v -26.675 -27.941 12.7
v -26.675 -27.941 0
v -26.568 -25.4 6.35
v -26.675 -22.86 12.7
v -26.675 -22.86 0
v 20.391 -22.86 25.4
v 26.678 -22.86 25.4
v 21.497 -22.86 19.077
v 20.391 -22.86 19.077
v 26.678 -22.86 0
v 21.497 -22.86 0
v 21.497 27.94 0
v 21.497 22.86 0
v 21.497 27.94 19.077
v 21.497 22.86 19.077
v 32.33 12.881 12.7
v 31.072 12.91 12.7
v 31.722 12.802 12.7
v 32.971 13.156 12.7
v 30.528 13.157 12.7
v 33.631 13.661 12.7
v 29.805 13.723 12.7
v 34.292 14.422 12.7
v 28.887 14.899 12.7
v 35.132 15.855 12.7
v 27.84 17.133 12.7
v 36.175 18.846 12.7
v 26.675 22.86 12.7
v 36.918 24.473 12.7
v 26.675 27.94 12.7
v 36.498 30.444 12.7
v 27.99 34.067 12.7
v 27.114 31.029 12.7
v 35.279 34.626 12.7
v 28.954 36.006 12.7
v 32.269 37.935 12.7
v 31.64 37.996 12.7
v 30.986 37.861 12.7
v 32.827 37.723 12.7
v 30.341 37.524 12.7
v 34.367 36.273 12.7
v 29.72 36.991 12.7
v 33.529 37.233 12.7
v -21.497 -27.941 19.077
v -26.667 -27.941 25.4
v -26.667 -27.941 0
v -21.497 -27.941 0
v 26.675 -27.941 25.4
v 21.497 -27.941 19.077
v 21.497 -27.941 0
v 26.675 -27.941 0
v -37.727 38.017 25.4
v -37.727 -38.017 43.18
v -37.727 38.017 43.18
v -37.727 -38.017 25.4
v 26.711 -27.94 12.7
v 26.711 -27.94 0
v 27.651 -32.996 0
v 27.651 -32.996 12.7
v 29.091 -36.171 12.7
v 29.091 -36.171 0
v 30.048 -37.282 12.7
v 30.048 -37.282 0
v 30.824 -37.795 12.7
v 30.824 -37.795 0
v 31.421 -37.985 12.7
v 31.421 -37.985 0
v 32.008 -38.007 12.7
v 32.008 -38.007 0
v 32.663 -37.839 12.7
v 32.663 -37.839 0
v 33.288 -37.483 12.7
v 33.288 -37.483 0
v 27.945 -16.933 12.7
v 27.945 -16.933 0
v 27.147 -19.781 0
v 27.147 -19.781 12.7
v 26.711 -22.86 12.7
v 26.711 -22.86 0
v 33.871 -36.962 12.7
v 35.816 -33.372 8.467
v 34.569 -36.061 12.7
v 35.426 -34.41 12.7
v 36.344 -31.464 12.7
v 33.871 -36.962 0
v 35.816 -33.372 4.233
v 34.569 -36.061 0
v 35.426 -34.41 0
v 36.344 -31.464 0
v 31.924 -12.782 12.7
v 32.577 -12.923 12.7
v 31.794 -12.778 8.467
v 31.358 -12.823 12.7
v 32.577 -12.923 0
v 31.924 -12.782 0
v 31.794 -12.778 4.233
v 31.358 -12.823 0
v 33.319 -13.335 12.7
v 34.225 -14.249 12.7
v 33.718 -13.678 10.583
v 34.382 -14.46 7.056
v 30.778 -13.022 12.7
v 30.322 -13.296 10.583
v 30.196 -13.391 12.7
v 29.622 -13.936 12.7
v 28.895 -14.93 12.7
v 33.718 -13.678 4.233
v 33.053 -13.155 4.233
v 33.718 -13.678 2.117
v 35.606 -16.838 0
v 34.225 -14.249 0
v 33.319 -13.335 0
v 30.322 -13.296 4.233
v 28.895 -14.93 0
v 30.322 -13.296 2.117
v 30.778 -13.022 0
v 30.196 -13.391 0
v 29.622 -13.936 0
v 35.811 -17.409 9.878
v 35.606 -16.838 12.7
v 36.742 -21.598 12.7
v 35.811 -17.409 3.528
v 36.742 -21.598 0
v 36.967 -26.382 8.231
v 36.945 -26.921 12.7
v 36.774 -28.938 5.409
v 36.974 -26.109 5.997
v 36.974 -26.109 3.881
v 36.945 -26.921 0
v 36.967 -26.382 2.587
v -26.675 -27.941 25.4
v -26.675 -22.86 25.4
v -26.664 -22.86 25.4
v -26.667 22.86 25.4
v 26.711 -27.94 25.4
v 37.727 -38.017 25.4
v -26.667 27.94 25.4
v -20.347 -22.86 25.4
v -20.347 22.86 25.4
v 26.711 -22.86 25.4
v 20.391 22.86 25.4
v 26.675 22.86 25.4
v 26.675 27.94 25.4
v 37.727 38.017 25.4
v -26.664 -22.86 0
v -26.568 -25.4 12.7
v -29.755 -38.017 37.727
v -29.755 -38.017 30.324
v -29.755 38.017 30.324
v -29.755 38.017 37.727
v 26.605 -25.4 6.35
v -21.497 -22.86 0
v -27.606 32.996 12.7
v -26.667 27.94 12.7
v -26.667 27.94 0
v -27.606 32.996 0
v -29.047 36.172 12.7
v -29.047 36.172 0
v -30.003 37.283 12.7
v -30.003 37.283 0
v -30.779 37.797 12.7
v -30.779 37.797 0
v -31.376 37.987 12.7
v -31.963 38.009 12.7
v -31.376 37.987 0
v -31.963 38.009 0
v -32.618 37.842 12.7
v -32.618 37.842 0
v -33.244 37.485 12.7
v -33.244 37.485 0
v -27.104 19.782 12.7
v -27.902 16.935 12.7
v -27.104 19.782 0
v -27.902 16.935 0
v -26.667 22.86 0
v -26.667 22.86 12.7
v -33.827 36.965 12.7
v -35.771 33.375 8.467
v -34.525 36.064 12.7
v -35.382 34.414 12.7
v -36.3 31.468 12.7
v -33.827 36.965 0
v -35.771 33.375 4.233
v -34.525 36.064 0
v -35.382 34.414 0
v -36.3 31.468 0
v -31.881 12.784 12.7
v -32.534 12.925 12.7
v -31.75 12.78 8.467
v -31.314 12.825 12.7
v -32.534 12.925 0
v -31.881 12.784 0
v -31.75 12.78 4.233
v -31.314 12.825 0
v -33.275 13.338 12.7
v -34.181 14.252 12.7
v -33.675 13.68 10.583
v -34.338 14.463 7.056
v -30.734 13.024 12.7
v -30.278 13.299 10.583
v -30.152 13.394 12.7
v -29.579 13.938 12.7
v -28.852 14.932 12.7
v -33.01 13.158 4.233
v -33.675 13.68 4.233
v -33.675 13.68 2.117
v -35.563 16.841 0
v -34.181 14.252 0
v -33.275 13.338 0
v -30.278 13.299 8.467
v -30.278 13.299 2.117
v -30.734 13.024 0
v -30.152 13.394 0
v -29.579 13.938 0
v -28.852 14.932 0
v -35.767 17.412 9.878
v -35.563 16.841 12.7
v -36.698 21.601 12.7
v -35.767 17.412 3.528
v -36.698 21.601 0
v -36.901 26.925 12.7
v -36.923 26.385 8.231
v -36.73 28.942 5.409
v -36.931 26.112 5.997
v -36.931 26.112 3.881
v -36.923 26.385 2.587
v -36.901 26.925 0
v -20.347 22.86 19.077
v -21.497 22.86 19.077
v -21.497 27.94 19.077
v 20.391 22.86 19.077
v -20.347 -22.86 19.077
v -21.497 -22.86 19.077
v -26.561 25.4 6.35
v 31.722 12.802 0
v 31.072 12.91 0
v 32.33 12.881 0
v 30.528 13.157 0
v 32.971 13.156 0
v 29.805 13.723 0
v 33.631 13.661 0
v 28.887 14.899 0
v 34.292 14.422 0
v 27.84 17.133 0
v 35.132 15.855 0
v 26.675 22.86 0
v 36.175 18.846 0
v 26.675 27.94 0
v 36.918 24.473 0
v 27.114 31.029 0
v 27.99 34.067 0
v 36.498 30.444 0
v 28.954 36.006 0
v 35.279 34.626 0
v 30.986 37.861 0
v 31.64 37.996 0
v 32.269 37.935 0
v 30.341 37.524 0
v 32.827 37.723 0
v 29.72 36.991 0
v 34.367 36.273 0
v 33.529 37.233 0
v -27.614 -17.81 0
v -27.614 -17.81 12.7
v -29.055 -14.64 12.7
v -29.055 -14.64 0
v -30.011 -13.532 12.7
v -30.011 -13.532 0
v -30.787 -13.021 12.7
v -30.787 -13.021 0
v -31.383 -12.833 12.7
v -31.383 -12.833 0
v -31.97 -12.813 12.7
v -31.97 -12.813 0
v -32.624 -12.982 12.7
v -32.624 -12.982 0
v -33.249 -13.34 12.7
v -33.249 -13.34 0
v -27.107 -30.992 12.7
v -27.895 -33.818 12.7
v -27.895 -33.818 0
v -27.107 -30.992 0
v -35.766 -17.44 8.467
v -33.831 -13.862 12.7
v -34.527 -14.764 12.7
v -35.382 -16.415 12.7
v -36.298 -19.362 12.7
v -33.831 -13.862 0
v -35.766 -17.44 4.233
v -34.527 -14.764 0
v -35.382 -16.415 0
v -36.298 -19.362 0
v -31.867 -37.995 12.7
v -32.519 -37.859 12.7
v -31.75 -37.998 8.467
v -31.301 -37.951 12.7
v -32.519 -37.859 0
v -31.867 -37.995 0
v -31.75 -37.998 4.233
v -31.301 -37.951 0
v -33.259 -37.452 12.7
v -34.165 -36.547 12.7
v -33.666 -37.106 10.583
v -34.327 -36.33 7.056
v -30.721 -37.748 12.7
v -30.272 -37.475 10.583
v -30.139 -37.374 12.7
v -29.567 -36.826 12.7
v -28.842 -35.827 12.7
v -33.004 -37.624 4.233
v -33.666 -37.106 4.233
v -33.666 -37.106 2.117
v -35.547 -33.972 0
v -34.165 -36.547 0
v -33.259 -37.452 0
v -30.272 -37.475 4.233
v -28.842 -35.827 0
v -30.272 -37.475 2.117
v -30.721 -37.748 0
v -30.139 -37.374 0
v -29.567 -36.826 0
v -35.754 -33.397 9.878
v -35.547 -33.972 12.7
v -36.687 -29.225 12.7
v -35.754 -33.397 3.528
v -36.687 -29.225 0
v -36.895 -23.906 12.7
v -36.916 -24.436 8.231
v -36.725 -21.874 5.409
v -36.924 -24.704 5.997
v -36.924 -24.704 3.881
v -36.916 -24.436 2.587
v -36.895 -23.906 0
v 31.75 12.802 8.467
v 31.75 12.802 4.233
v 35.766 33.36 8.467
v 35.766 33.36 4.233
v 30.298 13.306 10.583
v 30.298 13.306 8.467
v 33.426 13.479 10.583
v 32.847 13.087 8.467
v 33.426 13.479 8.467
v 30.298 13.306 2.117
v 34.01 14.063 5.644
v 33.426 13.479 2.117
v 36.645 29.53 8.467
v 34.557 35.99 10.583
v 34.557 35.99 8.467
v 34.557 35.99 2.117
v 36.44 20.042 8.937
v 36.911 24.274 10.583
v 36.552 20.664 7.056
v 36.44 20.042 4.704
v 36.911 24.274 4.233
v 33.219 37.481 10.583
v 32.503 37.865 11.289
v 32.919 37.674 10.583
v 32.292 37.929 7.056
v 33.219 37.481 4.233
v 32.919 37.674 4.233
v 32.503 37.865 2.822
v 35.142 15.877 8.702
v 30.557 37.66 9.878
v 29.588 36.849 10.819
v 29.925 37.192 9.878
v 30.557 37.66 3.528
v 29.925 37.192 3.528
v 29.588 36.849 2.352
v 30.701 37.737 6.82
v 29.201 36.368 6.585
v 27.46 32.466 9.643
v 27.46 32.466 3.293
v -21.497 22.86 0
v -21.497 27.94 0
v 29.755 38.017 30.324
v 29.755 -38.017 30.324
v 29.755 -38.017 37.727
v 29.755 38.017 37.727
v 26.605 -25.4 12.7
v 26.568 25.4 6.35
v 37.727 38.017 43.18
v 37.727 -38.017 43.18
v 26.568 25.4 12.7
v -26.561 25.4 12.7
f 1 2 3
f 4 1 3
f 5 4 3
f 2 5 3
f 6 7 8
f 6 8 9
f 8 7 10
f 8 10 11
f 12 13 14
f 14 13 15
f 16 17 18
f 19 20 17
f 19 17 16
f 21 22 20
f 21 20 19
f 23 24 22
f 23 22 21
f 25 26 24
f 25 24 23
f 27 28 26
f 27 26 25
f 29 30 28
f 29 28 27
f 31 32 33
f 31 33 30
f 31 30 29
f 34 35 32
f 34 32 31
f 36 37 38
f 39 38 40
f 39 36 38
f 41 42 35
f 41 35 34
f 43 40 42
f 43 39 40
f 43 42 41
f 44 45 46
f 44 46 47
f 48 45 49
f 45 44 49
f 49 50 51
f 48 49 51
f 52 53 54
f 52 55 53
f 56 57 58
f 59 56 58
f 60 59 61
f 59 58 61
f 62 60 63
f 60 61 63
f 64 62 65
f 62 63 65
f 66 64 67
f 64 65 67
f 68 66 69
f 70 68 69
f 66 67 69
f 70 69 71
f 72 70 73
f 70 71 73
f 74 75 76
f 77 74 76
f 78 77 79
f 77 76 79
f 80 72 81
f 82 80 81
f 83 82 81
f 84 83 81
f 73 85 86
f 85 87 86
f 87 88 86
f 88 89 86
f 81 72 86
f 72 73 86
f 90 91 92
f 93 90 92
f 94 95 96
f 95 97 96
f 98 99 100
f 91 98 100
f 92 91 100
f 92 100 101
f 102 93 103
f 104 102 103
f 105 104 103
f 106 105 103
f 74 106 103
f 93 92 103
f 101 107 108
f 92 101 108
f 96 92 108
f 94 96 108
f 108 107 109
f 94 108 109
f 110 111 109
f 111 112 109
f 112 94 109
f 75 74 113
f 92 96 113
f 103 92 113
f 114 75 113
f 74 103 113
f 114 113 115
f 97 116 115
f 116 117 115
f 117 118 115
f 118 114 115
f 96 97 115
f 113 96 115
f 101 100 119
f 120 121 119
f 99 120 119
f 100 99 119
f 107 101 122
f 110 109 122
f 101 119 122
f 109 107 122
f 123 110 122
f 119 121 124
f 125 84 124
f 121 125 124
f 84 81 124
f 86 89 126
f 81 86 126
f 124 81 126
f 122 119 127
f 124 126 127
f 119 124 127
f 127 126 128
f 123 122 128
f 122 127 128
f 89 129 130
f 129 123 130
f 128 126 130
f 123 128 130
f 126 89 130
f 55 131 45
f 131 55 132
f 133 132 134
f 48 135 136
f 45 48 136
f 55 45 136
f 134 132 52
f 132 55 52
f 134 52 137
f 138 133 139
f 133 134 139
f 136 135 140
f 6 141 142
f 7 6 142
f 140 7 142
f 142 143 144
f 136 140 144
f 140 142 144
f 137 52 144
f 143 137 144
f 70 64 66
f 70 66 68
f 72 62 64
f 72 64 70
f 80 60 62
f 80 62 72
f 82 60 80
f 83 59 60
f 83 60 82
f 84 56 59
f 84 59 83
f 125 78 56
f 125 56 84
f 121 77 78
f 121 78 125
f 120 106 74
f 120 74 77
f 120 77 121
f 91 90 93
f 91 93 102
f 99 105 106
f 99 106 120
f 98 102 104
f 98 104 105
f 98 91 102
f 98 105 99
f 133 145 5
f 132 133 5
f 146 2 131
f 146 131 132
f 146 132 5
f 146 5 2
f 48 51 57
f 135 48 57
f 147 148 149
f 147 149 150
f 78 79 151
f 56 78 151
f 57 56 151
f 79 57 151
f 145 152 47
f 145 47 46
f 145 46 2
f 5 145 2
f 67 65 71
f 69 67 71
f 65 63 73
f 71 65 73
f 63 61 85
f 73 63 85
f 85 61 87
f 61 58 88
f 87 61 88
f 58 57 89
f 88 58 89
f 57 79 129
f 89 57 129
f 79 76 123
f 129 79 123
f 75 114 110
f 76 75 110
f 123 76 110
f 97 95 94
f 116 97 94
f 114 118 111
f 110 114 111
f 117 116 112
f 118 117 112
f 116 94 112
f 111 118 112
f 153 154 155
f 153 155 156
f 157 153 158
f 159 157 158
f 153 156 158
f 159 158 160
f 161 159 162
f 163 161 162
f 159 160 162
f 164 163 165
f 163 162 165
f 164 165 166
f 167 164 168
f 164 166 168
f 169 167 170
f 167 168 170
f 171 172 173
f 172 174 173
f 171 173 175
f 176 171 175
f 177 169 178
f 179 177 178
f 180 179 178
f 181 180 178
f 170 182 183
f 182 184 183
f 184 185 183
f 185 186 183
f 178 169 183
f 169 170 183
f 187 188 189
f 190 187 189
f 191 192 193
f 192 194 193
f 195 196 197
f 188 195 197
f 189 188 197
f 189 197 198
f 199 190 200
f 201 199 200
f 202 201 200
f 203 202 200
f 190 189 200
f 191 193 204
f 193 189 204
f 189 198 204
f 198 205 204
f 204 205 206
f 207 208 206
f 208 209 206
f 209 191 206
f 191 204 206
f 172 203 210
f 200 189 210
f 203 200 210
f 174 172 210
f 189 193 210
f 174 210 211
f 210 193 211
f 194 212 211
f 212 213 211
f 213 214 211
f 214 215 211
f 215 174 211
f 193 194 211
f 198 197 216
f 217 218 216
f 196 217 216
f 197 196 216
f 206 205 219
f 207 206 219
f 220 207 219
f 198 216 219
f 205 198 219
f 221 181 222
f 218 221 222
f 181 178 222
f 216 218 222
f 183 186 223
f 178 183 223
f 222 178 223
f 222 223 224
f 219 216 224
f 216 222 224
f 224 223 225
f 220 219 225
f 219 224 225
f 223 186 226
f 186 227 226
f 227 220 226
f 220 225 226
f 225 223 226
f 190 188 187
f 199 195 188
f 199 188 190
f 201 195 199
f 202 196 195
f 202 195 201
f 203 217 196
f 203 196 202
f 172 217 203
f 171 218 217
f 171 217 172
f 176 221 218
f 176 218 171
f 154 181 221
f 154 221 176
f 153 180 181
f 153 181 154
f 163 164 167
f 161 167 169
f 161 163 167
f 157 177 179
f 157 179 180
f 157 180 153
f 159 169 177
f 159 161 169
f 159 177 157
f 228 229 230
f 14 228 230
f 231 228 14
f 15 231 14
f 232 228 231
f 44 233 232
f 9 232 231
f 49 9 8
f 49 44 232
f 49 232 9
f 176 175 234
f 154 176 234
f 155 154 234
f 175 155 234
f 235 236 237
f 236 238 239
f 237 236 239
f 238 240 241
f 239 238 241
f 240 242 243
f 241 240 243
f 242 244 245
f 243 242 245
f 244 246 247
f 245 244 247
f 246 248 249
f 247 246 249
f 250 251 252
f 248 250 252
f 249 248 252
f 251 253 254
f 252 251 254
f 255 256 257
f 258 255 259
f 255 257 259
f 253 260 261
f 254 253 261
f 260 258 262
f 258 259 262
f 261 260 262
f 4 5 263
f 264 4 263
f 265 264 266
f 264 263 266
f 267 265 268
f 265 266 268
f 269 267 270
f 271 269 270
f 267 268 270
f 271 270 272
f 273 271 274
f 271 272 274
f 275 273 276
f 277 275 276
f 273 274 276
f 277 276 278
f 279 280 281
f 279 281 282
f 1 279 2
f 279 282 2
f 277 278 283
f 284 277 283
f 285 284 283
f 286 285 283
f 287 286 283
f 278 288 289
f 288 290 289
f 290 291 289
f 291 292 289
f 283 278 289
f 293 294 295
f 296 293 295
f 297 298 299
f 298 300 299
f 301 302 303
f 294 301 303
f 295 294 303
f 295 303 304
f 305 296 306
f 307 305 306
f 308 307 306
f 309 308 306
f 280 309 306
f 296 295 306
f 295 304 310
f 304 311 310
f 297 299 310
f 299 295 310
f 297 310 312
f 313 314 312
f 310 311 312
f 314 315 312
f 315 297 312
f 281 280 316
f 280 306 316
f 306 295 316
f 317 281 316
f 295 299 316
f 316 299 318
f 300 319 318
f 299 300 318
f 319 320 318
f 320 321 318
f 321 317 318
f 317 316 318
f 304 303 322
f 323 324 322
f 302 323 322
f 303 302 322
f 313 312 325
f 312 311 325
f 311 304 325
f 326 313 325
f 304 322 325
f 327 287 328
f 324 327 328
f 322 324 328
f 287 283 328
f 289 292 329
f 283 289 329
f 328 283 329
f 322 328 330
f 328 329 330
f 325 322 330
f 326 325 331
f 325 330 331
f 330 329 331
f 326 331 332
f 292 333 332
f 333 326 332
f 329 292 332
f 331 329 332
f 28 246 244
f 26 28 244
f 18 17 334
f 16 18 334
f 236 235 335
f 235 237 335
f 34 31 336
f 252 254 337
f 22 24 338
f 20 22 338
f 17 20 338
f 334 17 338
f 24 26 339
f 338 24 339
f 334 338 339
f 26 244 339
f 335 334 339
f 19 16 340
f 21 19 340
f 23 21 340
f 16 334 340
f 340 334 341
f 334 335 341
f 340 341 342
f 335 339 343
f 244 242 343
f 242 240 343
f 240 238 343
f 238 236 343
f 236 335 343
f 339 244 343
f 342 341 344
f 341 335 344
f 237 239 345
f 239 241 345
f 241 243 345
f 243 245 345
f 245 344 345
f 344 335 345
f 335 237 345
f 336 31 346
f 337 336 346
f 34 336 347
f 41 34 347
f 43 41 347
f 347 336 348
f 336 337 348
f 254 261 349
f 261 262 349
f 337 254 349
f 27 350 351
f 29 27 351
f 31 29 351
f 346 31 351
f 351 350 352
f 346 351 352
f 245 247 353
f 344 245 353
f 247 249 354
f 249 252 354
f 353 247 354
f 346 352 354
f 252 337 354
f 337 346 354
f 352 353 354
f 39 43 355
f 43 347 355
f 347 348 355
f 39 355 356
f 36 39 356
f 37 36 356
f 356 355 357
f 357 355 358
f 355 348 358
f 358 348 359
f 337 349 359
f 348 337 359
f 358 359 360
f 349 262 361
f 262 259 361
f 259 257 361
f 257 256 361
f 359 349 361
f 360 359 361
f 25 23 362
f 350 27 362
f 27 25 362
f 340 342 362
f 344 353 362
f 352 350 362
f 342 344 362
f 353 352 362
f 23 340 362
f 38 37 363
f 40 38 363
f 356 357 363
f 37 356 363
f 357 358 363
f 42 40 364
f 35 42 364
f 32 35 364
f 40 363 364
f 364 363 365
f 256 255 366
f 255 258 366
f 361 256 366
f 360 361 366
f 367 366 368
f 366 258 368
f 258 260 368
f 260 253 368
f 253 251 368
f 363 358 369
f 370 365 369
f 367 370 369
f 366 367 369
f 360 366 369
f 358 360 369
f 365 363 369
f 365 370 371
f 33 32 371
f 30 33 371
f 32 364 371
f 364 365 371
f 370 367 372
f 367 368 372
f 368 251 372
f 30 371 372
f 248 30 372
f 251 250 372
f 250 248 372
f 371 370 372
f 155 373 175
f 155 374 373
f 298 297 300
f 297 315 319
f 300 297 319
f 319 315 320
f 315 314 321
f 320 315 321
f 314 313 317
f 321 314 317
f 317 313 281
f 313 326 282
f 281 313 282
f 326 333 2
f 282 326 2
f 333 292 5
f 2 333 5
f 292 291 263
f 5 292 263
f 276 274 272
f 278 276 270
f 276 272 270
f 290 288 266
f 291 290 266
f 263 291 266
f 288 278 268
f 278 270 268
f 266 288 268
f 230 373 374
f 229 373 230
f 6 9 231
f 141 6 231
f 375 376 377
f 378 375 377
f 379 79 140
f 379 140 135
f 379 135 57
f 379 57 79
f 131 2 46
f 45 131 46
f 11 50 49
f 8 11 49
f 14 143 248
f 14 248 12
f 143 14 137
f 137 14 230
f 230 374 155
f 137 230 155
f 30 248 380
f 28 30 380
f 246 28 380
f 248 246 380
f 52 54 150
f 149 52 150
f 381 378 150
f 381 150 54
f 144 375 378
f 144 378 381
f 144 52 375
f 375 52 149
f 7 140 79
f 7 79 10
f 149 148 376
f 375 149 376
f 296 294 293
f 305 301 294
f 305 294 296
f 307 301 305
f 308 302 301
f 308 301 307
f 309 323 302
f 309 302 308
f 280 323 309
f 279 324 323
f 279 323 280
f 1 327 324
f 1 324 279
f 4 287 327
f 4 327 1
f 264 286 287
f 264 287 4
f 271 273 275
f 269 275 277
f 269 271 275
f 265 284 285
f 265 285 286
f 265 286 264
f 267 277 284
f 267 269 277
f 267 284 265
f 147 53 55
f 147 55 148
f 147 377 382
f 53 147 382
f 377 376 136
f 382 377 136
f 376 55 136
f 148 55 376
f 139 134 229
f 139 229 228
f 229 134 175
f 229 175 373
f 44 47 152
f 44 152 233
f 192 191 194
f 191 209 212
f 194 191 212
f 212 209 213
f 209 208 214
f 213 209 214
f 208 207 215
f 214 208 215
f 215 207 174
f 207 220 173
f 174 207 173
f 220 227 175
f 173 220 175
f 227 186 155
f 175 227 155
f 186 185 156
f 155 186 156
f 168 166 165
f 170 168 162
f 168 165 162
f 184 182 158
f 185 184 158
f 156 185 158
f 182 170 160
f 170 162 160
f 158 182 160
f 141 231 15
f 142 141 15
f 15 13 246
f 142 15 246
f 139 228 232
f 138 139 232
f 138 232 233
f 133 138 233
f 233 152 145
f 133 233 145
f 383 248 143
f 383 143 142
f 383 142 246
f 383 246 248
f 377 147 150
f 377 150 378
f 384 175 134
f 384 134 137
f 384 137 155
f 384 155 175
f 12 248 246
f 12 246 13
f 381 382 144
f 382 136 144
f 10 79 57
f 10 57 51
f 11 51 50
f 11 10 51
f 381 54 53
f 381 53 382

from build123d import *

# Parameters (mm, degrees)
F1_DEPTH  = 12.7
F2_DEPTH  = 25.4
F3_W      = 75.4542723298
F3_H      = 76.0345155845
F4_DEPTH  = 5.08
F5_W      = 75.4542723298
F5_H      = 76.0345155845
F5_W_2    = 62.7542723298
F5_H_2    = 63.3345155845
F6_DEPTH  = 12.7
F7_W      = 59.5092140138
F7_H      = 7.4030607939
F8_DEPTH  = 76.2
F9_W      = 42.9946966469
F9_H      = 19.0771184862
F10_DEPTH = 76.2


with BuildPart() as f1:
    # F0 (on Top) → F1 (new body)
    with BuildSketch(Plane.XY):
        with BuildLine():
            add(Edge.make_bspline(
                [(-26.6673212629, 27.94), (-28.8665013823, 53.9696522782), (-35.7714125826, 33.37500591), (-42.676323783, 12.7803595418), (-31.75, 12.7803595418)],
                knots=[1.7734542453, 1.7734542453, 1.7734542453, 4.0283197763, 4.0283197763, 6.2831853072, 6.2831853072, 6.2831853072], degree=2, weights=[1, 0.4289802376, 1, 0.4289802376, 1]))
            add(Edge.make_bspline(
                [(-31.75, 12.7803595418), (-27.5189248367, 12.7803595418), (-26.6673212629, 22.86)],
                knots=[0, 0, 0, 1.3681384083, 1.3681384083, 1.3681384083], degree=2, weights=[1, 0.775007601, 1]))
            add(Edge.make_bspline(
                [(-26.6673212629, 22.86), (-26.4527230254, 25.4), (-26.6673212629, 27.94)],
                knots=[1.3681384083, 1.3681384083, 1.3681384083, 1.7734542453, 1.7734542453, 1.7734542453], degree=2, weights=[1, 0.9795350697, 1]))
        make_face()
    extrude(amount=F1_DEPTH)


with BuildPart() as f1b:
    # F0 (on Top) → F1, piece 2 (new body)
    with BuildSketch(Plane.XY):
        with BuildLine():
            add(Edge.make_bspline(
                [(31.7938316671, -12.7779768759), (27.5620741915, -12.7779768759), (26.7109880314, -22.8595698679)],
                knots=[0, 0, 0, 1.36829636, 1.36829636, 1.36829636], degree=2, weights=[1, 0.7749576896, 1]))
            add(Edge.make_bspline(
                [(26.7109880314, -22.8595698679), (26.4965220883, -25.4000392711), (26.7113807542, -27.9403123866)],
                knots=[1.36829636, 1.36829636, 1.36829636, 1.7736722722, 1.7736722722, 1.7736722722], degree=2, weights=[1, 0.9795290235, 1]))
            add(Edge.make_bspline(
                [(26.7113807542, -27.9403123866), (28.9125846693, -53.9651371457), (35.8156016935, -33.3715570108), (42.7186187177, -12.7779768759), (31.7938316671, -12.7779768759)],
                knots=[1.7736722722, 1.7736722722, 1.7736722722, 4.0284287897, 4.0284287897, 6.2831853072, 6.2831853072, 6.2831853072], degree=2, weights=[1, 0.4290294736, 1, 0.4290294736, 1]))
        make_face()
    extrude(amount=F1_DEPTH)


with BuildPart() as f1c:
    # F0 (on Top) → F1, piece 3 (new body)
    with BuildSketch(Plane.XY):
        with BuildLine():
            add(Edge.make_bspline(
                [(31.75, 12.8016), (42.6585799166, 12.8016), (35.7663465411, 33.3598915369), (28.8741131655, 53.9181830739), (26.6748026985, 27.94)],
                knots=[0, 0, 0, 2.2546923099, 2.2546923099, 4.5093846197, 4.5093846197, 4.5093846197], degree=2, weights=[1, 0.4290584725, 1, 0.4290584725, 1]))
            add(Edge.make_bspline(
                [(26.6748026985, 27.94), (26.4597665441, 25.4), (26.6748026985, 22.86)],
                knots=[4.5093846197, 4.5093846197, 4.5093846197, 4.915393341, 4.915393341, 4.915393341], degree=2, weights=[1, 0.9794652813, 1]))
            add(Edge.make_bspline(
                [(26.6748026985, 22.86), (27.5263458699, 12.8016), (31.75, 12.8016)],
                knots=[4.915393341, 4.915393341, 4.915393341, 6.2831853072, 6.2831853072, 6.2831853072], degree=2, weights=[1, 0.7751170567, 1]))
        make_face()
    extrude(amount=F1_DEPTH)


with BuildPart() as f1d:
    # F0 (on Top) → F1, piece 4 (new body)
    with BuildSketch(Plane.XY):
        with BuildLine():
            add(Edge.make_bspline(
                [(-26.6748525876, -27.940589218), (-26.4597237971, -25.4001093108), (-26.6748348282, -22.8596205137)],
                knots=[1.3677442161, 1.3677442161, 1.3677442161, 1.7738314409, 1.7738314409, 1.7738314409], degree=2, weights=[1, 0.9794573669, 1]))
            add(Edge.make_bspline(
                [(-26.6748348282, -22.8596205137), (-28.8744302457, 3.1178827579), (-35.7663968812, -17.440258621), (-42.6583635168, -37.9984), (-31.75, -37.9984)],
                knots=[1.7738314409, 1.7738314409, 1.7738314409, 4.028508374, 4.028508374, 6.2831853072, 6.2831853072, 6.2831853072], degree=2, weights=[1, 0.4290654172, 1, 0.4290654172, 1]))
            add(Edge.make_bspline(
                [(-31.75, -37.9984), (-27.5265517738, -37.9984), (-26.6748525876, -27.940589218)],
                knots=[0, 0, 0, 1.3677442161, 1.3677442161, 1.3677442161], degree=2, weights=[1, 0.7751321412, 1]))
        make_face()
    extrude(amount=F1_DEPTH)


with BuildPart() as f2:
    # F0 (on Top) → F2 (new body)
    with BuildSketch(Plane.XY):
        with BuildLine():
            add(Edge.make_bspline(
                [(-26.6673212629, 22.86), (-26.4527230254, 25.4), (-26.6673212629, 27.94)],
                knots=[1.3681384083, 1.3681384083, 1.3681384083, 1.7734542453, 1.7734542453, 1.7734542453], degree=2, weights=[1, 0.9795350697, 1]))
            Line((-26.6673212629, 22.86), (-20.3471054377, 22.86))
            Line((-20.3471054377, 22.86), (-20.3471054377, -22.8596810407))
            Line((-20.3471054377, -22.8596810407), (-26.6641747104, -22.8596810407))
            Line((-26.6641747104, -22.8596810407), (-26.6748348282, -22.8596205137))
            add(Edge.make_bspline(
                [(-26.6748525876, -27.940589218), (-26.4597237971, -25.4001093108), (-26.6748348282, -22.8596205137)],
                knots=[1.3677442161, 1.3677442161, 1.3677442161, 1.7738314409, 1.7738314409, 1.7738314409], degree=2, weights=[1, 0.9794573669, 1]))
            Line((-26.6748525876, -27.940589218), (-26.6674692391, -27.9405932133))
            Line((-26.6674692391, -27.9405932133), (26.6746547223, -27.9405932133))
            Line((26.6746547223, -27.9405932133), (26.7113807542, -27.9403123866))
            add(Edge.make_bspline(
                [(26.7109880314, -22.8595698679), (26.4965220883, -25.4000392711), (26.7113807542, -27.9403123866)],
                knots=[1.36829636, 1.36829636, 1.36829636, 1.7736722722, 1.7736722722, 1.7736722722], degree=2, weights=[1, 0.9795290235, 1]))
            Line((26.7109880314, -22.8595698679), (26.677949251, -22.8596810407))
            Line((26.677949251, -22.8596810407), (20.3909371048, -22.8596810407))
            Line((20.3909371048, -22.8596810407), (20.3909371048, 22.86))
            Line((20.3909371048, 22.86), (26.6748026985, 22.86))
            add(Edge.make_bspline(
                [(26.6748026985, 27.94), (26.4597665441, 25.4), (26.6748026985, 22.86)],
                knots=[4.5093846197, 4.5093846197, 4.5093846197, 4.915393341, 4.915393341, 4.915393341], degree=2, weights=[1, 0.9794652813, 1]))
            Line((26.6748026985, 27.94), (-26.6673212629, 27.94))
        make_face()
    extrude(amount=F2_DEPTH)

    # F3 (on face) → F4 (join)
    with BuildSketch(Plane.XY.offset(25.4)):
        Rectangle(F3_W, F3_H)
    extrude(amount=F4_DEPTH)

    # F5 (on face) → F6 (join)
    with BuildSketch(Plane.XY.offset(30.48)):
        Rectangle(F5_W, F5_H)
        Rectangle(F5_W_2, F5_H_2, mode=Mode.SUBTRACT)
        Rectangle(F5_W_2, F5_H_2)
    extrude(amount=F6_DEPTH)

    # F7 (on face) → F8 (cut)
    with BuildSketch(Plane.XZ.offset(38.0172577923)):
        with Locations((0, 34.025605768)):
            Rectangle(F7_W, F7_H)
    extrude(amount=-F8_DEPTH, mode=Mode.SUBTRACT)

    # F9 (on face) → F10 (cut)
    with BuildSketch(Plane.XZ.offset(27.9405932133)):
        with Locations((0, 9.5385592431)):
            Rectangle(F9_W, F9_H)
    extrude(amount=-F10_DEPTH, mode=Mode.SUBTRACT)


solid = Compound([f1.part, f1b.part, f1c.part, f1d.part, f2.part])
